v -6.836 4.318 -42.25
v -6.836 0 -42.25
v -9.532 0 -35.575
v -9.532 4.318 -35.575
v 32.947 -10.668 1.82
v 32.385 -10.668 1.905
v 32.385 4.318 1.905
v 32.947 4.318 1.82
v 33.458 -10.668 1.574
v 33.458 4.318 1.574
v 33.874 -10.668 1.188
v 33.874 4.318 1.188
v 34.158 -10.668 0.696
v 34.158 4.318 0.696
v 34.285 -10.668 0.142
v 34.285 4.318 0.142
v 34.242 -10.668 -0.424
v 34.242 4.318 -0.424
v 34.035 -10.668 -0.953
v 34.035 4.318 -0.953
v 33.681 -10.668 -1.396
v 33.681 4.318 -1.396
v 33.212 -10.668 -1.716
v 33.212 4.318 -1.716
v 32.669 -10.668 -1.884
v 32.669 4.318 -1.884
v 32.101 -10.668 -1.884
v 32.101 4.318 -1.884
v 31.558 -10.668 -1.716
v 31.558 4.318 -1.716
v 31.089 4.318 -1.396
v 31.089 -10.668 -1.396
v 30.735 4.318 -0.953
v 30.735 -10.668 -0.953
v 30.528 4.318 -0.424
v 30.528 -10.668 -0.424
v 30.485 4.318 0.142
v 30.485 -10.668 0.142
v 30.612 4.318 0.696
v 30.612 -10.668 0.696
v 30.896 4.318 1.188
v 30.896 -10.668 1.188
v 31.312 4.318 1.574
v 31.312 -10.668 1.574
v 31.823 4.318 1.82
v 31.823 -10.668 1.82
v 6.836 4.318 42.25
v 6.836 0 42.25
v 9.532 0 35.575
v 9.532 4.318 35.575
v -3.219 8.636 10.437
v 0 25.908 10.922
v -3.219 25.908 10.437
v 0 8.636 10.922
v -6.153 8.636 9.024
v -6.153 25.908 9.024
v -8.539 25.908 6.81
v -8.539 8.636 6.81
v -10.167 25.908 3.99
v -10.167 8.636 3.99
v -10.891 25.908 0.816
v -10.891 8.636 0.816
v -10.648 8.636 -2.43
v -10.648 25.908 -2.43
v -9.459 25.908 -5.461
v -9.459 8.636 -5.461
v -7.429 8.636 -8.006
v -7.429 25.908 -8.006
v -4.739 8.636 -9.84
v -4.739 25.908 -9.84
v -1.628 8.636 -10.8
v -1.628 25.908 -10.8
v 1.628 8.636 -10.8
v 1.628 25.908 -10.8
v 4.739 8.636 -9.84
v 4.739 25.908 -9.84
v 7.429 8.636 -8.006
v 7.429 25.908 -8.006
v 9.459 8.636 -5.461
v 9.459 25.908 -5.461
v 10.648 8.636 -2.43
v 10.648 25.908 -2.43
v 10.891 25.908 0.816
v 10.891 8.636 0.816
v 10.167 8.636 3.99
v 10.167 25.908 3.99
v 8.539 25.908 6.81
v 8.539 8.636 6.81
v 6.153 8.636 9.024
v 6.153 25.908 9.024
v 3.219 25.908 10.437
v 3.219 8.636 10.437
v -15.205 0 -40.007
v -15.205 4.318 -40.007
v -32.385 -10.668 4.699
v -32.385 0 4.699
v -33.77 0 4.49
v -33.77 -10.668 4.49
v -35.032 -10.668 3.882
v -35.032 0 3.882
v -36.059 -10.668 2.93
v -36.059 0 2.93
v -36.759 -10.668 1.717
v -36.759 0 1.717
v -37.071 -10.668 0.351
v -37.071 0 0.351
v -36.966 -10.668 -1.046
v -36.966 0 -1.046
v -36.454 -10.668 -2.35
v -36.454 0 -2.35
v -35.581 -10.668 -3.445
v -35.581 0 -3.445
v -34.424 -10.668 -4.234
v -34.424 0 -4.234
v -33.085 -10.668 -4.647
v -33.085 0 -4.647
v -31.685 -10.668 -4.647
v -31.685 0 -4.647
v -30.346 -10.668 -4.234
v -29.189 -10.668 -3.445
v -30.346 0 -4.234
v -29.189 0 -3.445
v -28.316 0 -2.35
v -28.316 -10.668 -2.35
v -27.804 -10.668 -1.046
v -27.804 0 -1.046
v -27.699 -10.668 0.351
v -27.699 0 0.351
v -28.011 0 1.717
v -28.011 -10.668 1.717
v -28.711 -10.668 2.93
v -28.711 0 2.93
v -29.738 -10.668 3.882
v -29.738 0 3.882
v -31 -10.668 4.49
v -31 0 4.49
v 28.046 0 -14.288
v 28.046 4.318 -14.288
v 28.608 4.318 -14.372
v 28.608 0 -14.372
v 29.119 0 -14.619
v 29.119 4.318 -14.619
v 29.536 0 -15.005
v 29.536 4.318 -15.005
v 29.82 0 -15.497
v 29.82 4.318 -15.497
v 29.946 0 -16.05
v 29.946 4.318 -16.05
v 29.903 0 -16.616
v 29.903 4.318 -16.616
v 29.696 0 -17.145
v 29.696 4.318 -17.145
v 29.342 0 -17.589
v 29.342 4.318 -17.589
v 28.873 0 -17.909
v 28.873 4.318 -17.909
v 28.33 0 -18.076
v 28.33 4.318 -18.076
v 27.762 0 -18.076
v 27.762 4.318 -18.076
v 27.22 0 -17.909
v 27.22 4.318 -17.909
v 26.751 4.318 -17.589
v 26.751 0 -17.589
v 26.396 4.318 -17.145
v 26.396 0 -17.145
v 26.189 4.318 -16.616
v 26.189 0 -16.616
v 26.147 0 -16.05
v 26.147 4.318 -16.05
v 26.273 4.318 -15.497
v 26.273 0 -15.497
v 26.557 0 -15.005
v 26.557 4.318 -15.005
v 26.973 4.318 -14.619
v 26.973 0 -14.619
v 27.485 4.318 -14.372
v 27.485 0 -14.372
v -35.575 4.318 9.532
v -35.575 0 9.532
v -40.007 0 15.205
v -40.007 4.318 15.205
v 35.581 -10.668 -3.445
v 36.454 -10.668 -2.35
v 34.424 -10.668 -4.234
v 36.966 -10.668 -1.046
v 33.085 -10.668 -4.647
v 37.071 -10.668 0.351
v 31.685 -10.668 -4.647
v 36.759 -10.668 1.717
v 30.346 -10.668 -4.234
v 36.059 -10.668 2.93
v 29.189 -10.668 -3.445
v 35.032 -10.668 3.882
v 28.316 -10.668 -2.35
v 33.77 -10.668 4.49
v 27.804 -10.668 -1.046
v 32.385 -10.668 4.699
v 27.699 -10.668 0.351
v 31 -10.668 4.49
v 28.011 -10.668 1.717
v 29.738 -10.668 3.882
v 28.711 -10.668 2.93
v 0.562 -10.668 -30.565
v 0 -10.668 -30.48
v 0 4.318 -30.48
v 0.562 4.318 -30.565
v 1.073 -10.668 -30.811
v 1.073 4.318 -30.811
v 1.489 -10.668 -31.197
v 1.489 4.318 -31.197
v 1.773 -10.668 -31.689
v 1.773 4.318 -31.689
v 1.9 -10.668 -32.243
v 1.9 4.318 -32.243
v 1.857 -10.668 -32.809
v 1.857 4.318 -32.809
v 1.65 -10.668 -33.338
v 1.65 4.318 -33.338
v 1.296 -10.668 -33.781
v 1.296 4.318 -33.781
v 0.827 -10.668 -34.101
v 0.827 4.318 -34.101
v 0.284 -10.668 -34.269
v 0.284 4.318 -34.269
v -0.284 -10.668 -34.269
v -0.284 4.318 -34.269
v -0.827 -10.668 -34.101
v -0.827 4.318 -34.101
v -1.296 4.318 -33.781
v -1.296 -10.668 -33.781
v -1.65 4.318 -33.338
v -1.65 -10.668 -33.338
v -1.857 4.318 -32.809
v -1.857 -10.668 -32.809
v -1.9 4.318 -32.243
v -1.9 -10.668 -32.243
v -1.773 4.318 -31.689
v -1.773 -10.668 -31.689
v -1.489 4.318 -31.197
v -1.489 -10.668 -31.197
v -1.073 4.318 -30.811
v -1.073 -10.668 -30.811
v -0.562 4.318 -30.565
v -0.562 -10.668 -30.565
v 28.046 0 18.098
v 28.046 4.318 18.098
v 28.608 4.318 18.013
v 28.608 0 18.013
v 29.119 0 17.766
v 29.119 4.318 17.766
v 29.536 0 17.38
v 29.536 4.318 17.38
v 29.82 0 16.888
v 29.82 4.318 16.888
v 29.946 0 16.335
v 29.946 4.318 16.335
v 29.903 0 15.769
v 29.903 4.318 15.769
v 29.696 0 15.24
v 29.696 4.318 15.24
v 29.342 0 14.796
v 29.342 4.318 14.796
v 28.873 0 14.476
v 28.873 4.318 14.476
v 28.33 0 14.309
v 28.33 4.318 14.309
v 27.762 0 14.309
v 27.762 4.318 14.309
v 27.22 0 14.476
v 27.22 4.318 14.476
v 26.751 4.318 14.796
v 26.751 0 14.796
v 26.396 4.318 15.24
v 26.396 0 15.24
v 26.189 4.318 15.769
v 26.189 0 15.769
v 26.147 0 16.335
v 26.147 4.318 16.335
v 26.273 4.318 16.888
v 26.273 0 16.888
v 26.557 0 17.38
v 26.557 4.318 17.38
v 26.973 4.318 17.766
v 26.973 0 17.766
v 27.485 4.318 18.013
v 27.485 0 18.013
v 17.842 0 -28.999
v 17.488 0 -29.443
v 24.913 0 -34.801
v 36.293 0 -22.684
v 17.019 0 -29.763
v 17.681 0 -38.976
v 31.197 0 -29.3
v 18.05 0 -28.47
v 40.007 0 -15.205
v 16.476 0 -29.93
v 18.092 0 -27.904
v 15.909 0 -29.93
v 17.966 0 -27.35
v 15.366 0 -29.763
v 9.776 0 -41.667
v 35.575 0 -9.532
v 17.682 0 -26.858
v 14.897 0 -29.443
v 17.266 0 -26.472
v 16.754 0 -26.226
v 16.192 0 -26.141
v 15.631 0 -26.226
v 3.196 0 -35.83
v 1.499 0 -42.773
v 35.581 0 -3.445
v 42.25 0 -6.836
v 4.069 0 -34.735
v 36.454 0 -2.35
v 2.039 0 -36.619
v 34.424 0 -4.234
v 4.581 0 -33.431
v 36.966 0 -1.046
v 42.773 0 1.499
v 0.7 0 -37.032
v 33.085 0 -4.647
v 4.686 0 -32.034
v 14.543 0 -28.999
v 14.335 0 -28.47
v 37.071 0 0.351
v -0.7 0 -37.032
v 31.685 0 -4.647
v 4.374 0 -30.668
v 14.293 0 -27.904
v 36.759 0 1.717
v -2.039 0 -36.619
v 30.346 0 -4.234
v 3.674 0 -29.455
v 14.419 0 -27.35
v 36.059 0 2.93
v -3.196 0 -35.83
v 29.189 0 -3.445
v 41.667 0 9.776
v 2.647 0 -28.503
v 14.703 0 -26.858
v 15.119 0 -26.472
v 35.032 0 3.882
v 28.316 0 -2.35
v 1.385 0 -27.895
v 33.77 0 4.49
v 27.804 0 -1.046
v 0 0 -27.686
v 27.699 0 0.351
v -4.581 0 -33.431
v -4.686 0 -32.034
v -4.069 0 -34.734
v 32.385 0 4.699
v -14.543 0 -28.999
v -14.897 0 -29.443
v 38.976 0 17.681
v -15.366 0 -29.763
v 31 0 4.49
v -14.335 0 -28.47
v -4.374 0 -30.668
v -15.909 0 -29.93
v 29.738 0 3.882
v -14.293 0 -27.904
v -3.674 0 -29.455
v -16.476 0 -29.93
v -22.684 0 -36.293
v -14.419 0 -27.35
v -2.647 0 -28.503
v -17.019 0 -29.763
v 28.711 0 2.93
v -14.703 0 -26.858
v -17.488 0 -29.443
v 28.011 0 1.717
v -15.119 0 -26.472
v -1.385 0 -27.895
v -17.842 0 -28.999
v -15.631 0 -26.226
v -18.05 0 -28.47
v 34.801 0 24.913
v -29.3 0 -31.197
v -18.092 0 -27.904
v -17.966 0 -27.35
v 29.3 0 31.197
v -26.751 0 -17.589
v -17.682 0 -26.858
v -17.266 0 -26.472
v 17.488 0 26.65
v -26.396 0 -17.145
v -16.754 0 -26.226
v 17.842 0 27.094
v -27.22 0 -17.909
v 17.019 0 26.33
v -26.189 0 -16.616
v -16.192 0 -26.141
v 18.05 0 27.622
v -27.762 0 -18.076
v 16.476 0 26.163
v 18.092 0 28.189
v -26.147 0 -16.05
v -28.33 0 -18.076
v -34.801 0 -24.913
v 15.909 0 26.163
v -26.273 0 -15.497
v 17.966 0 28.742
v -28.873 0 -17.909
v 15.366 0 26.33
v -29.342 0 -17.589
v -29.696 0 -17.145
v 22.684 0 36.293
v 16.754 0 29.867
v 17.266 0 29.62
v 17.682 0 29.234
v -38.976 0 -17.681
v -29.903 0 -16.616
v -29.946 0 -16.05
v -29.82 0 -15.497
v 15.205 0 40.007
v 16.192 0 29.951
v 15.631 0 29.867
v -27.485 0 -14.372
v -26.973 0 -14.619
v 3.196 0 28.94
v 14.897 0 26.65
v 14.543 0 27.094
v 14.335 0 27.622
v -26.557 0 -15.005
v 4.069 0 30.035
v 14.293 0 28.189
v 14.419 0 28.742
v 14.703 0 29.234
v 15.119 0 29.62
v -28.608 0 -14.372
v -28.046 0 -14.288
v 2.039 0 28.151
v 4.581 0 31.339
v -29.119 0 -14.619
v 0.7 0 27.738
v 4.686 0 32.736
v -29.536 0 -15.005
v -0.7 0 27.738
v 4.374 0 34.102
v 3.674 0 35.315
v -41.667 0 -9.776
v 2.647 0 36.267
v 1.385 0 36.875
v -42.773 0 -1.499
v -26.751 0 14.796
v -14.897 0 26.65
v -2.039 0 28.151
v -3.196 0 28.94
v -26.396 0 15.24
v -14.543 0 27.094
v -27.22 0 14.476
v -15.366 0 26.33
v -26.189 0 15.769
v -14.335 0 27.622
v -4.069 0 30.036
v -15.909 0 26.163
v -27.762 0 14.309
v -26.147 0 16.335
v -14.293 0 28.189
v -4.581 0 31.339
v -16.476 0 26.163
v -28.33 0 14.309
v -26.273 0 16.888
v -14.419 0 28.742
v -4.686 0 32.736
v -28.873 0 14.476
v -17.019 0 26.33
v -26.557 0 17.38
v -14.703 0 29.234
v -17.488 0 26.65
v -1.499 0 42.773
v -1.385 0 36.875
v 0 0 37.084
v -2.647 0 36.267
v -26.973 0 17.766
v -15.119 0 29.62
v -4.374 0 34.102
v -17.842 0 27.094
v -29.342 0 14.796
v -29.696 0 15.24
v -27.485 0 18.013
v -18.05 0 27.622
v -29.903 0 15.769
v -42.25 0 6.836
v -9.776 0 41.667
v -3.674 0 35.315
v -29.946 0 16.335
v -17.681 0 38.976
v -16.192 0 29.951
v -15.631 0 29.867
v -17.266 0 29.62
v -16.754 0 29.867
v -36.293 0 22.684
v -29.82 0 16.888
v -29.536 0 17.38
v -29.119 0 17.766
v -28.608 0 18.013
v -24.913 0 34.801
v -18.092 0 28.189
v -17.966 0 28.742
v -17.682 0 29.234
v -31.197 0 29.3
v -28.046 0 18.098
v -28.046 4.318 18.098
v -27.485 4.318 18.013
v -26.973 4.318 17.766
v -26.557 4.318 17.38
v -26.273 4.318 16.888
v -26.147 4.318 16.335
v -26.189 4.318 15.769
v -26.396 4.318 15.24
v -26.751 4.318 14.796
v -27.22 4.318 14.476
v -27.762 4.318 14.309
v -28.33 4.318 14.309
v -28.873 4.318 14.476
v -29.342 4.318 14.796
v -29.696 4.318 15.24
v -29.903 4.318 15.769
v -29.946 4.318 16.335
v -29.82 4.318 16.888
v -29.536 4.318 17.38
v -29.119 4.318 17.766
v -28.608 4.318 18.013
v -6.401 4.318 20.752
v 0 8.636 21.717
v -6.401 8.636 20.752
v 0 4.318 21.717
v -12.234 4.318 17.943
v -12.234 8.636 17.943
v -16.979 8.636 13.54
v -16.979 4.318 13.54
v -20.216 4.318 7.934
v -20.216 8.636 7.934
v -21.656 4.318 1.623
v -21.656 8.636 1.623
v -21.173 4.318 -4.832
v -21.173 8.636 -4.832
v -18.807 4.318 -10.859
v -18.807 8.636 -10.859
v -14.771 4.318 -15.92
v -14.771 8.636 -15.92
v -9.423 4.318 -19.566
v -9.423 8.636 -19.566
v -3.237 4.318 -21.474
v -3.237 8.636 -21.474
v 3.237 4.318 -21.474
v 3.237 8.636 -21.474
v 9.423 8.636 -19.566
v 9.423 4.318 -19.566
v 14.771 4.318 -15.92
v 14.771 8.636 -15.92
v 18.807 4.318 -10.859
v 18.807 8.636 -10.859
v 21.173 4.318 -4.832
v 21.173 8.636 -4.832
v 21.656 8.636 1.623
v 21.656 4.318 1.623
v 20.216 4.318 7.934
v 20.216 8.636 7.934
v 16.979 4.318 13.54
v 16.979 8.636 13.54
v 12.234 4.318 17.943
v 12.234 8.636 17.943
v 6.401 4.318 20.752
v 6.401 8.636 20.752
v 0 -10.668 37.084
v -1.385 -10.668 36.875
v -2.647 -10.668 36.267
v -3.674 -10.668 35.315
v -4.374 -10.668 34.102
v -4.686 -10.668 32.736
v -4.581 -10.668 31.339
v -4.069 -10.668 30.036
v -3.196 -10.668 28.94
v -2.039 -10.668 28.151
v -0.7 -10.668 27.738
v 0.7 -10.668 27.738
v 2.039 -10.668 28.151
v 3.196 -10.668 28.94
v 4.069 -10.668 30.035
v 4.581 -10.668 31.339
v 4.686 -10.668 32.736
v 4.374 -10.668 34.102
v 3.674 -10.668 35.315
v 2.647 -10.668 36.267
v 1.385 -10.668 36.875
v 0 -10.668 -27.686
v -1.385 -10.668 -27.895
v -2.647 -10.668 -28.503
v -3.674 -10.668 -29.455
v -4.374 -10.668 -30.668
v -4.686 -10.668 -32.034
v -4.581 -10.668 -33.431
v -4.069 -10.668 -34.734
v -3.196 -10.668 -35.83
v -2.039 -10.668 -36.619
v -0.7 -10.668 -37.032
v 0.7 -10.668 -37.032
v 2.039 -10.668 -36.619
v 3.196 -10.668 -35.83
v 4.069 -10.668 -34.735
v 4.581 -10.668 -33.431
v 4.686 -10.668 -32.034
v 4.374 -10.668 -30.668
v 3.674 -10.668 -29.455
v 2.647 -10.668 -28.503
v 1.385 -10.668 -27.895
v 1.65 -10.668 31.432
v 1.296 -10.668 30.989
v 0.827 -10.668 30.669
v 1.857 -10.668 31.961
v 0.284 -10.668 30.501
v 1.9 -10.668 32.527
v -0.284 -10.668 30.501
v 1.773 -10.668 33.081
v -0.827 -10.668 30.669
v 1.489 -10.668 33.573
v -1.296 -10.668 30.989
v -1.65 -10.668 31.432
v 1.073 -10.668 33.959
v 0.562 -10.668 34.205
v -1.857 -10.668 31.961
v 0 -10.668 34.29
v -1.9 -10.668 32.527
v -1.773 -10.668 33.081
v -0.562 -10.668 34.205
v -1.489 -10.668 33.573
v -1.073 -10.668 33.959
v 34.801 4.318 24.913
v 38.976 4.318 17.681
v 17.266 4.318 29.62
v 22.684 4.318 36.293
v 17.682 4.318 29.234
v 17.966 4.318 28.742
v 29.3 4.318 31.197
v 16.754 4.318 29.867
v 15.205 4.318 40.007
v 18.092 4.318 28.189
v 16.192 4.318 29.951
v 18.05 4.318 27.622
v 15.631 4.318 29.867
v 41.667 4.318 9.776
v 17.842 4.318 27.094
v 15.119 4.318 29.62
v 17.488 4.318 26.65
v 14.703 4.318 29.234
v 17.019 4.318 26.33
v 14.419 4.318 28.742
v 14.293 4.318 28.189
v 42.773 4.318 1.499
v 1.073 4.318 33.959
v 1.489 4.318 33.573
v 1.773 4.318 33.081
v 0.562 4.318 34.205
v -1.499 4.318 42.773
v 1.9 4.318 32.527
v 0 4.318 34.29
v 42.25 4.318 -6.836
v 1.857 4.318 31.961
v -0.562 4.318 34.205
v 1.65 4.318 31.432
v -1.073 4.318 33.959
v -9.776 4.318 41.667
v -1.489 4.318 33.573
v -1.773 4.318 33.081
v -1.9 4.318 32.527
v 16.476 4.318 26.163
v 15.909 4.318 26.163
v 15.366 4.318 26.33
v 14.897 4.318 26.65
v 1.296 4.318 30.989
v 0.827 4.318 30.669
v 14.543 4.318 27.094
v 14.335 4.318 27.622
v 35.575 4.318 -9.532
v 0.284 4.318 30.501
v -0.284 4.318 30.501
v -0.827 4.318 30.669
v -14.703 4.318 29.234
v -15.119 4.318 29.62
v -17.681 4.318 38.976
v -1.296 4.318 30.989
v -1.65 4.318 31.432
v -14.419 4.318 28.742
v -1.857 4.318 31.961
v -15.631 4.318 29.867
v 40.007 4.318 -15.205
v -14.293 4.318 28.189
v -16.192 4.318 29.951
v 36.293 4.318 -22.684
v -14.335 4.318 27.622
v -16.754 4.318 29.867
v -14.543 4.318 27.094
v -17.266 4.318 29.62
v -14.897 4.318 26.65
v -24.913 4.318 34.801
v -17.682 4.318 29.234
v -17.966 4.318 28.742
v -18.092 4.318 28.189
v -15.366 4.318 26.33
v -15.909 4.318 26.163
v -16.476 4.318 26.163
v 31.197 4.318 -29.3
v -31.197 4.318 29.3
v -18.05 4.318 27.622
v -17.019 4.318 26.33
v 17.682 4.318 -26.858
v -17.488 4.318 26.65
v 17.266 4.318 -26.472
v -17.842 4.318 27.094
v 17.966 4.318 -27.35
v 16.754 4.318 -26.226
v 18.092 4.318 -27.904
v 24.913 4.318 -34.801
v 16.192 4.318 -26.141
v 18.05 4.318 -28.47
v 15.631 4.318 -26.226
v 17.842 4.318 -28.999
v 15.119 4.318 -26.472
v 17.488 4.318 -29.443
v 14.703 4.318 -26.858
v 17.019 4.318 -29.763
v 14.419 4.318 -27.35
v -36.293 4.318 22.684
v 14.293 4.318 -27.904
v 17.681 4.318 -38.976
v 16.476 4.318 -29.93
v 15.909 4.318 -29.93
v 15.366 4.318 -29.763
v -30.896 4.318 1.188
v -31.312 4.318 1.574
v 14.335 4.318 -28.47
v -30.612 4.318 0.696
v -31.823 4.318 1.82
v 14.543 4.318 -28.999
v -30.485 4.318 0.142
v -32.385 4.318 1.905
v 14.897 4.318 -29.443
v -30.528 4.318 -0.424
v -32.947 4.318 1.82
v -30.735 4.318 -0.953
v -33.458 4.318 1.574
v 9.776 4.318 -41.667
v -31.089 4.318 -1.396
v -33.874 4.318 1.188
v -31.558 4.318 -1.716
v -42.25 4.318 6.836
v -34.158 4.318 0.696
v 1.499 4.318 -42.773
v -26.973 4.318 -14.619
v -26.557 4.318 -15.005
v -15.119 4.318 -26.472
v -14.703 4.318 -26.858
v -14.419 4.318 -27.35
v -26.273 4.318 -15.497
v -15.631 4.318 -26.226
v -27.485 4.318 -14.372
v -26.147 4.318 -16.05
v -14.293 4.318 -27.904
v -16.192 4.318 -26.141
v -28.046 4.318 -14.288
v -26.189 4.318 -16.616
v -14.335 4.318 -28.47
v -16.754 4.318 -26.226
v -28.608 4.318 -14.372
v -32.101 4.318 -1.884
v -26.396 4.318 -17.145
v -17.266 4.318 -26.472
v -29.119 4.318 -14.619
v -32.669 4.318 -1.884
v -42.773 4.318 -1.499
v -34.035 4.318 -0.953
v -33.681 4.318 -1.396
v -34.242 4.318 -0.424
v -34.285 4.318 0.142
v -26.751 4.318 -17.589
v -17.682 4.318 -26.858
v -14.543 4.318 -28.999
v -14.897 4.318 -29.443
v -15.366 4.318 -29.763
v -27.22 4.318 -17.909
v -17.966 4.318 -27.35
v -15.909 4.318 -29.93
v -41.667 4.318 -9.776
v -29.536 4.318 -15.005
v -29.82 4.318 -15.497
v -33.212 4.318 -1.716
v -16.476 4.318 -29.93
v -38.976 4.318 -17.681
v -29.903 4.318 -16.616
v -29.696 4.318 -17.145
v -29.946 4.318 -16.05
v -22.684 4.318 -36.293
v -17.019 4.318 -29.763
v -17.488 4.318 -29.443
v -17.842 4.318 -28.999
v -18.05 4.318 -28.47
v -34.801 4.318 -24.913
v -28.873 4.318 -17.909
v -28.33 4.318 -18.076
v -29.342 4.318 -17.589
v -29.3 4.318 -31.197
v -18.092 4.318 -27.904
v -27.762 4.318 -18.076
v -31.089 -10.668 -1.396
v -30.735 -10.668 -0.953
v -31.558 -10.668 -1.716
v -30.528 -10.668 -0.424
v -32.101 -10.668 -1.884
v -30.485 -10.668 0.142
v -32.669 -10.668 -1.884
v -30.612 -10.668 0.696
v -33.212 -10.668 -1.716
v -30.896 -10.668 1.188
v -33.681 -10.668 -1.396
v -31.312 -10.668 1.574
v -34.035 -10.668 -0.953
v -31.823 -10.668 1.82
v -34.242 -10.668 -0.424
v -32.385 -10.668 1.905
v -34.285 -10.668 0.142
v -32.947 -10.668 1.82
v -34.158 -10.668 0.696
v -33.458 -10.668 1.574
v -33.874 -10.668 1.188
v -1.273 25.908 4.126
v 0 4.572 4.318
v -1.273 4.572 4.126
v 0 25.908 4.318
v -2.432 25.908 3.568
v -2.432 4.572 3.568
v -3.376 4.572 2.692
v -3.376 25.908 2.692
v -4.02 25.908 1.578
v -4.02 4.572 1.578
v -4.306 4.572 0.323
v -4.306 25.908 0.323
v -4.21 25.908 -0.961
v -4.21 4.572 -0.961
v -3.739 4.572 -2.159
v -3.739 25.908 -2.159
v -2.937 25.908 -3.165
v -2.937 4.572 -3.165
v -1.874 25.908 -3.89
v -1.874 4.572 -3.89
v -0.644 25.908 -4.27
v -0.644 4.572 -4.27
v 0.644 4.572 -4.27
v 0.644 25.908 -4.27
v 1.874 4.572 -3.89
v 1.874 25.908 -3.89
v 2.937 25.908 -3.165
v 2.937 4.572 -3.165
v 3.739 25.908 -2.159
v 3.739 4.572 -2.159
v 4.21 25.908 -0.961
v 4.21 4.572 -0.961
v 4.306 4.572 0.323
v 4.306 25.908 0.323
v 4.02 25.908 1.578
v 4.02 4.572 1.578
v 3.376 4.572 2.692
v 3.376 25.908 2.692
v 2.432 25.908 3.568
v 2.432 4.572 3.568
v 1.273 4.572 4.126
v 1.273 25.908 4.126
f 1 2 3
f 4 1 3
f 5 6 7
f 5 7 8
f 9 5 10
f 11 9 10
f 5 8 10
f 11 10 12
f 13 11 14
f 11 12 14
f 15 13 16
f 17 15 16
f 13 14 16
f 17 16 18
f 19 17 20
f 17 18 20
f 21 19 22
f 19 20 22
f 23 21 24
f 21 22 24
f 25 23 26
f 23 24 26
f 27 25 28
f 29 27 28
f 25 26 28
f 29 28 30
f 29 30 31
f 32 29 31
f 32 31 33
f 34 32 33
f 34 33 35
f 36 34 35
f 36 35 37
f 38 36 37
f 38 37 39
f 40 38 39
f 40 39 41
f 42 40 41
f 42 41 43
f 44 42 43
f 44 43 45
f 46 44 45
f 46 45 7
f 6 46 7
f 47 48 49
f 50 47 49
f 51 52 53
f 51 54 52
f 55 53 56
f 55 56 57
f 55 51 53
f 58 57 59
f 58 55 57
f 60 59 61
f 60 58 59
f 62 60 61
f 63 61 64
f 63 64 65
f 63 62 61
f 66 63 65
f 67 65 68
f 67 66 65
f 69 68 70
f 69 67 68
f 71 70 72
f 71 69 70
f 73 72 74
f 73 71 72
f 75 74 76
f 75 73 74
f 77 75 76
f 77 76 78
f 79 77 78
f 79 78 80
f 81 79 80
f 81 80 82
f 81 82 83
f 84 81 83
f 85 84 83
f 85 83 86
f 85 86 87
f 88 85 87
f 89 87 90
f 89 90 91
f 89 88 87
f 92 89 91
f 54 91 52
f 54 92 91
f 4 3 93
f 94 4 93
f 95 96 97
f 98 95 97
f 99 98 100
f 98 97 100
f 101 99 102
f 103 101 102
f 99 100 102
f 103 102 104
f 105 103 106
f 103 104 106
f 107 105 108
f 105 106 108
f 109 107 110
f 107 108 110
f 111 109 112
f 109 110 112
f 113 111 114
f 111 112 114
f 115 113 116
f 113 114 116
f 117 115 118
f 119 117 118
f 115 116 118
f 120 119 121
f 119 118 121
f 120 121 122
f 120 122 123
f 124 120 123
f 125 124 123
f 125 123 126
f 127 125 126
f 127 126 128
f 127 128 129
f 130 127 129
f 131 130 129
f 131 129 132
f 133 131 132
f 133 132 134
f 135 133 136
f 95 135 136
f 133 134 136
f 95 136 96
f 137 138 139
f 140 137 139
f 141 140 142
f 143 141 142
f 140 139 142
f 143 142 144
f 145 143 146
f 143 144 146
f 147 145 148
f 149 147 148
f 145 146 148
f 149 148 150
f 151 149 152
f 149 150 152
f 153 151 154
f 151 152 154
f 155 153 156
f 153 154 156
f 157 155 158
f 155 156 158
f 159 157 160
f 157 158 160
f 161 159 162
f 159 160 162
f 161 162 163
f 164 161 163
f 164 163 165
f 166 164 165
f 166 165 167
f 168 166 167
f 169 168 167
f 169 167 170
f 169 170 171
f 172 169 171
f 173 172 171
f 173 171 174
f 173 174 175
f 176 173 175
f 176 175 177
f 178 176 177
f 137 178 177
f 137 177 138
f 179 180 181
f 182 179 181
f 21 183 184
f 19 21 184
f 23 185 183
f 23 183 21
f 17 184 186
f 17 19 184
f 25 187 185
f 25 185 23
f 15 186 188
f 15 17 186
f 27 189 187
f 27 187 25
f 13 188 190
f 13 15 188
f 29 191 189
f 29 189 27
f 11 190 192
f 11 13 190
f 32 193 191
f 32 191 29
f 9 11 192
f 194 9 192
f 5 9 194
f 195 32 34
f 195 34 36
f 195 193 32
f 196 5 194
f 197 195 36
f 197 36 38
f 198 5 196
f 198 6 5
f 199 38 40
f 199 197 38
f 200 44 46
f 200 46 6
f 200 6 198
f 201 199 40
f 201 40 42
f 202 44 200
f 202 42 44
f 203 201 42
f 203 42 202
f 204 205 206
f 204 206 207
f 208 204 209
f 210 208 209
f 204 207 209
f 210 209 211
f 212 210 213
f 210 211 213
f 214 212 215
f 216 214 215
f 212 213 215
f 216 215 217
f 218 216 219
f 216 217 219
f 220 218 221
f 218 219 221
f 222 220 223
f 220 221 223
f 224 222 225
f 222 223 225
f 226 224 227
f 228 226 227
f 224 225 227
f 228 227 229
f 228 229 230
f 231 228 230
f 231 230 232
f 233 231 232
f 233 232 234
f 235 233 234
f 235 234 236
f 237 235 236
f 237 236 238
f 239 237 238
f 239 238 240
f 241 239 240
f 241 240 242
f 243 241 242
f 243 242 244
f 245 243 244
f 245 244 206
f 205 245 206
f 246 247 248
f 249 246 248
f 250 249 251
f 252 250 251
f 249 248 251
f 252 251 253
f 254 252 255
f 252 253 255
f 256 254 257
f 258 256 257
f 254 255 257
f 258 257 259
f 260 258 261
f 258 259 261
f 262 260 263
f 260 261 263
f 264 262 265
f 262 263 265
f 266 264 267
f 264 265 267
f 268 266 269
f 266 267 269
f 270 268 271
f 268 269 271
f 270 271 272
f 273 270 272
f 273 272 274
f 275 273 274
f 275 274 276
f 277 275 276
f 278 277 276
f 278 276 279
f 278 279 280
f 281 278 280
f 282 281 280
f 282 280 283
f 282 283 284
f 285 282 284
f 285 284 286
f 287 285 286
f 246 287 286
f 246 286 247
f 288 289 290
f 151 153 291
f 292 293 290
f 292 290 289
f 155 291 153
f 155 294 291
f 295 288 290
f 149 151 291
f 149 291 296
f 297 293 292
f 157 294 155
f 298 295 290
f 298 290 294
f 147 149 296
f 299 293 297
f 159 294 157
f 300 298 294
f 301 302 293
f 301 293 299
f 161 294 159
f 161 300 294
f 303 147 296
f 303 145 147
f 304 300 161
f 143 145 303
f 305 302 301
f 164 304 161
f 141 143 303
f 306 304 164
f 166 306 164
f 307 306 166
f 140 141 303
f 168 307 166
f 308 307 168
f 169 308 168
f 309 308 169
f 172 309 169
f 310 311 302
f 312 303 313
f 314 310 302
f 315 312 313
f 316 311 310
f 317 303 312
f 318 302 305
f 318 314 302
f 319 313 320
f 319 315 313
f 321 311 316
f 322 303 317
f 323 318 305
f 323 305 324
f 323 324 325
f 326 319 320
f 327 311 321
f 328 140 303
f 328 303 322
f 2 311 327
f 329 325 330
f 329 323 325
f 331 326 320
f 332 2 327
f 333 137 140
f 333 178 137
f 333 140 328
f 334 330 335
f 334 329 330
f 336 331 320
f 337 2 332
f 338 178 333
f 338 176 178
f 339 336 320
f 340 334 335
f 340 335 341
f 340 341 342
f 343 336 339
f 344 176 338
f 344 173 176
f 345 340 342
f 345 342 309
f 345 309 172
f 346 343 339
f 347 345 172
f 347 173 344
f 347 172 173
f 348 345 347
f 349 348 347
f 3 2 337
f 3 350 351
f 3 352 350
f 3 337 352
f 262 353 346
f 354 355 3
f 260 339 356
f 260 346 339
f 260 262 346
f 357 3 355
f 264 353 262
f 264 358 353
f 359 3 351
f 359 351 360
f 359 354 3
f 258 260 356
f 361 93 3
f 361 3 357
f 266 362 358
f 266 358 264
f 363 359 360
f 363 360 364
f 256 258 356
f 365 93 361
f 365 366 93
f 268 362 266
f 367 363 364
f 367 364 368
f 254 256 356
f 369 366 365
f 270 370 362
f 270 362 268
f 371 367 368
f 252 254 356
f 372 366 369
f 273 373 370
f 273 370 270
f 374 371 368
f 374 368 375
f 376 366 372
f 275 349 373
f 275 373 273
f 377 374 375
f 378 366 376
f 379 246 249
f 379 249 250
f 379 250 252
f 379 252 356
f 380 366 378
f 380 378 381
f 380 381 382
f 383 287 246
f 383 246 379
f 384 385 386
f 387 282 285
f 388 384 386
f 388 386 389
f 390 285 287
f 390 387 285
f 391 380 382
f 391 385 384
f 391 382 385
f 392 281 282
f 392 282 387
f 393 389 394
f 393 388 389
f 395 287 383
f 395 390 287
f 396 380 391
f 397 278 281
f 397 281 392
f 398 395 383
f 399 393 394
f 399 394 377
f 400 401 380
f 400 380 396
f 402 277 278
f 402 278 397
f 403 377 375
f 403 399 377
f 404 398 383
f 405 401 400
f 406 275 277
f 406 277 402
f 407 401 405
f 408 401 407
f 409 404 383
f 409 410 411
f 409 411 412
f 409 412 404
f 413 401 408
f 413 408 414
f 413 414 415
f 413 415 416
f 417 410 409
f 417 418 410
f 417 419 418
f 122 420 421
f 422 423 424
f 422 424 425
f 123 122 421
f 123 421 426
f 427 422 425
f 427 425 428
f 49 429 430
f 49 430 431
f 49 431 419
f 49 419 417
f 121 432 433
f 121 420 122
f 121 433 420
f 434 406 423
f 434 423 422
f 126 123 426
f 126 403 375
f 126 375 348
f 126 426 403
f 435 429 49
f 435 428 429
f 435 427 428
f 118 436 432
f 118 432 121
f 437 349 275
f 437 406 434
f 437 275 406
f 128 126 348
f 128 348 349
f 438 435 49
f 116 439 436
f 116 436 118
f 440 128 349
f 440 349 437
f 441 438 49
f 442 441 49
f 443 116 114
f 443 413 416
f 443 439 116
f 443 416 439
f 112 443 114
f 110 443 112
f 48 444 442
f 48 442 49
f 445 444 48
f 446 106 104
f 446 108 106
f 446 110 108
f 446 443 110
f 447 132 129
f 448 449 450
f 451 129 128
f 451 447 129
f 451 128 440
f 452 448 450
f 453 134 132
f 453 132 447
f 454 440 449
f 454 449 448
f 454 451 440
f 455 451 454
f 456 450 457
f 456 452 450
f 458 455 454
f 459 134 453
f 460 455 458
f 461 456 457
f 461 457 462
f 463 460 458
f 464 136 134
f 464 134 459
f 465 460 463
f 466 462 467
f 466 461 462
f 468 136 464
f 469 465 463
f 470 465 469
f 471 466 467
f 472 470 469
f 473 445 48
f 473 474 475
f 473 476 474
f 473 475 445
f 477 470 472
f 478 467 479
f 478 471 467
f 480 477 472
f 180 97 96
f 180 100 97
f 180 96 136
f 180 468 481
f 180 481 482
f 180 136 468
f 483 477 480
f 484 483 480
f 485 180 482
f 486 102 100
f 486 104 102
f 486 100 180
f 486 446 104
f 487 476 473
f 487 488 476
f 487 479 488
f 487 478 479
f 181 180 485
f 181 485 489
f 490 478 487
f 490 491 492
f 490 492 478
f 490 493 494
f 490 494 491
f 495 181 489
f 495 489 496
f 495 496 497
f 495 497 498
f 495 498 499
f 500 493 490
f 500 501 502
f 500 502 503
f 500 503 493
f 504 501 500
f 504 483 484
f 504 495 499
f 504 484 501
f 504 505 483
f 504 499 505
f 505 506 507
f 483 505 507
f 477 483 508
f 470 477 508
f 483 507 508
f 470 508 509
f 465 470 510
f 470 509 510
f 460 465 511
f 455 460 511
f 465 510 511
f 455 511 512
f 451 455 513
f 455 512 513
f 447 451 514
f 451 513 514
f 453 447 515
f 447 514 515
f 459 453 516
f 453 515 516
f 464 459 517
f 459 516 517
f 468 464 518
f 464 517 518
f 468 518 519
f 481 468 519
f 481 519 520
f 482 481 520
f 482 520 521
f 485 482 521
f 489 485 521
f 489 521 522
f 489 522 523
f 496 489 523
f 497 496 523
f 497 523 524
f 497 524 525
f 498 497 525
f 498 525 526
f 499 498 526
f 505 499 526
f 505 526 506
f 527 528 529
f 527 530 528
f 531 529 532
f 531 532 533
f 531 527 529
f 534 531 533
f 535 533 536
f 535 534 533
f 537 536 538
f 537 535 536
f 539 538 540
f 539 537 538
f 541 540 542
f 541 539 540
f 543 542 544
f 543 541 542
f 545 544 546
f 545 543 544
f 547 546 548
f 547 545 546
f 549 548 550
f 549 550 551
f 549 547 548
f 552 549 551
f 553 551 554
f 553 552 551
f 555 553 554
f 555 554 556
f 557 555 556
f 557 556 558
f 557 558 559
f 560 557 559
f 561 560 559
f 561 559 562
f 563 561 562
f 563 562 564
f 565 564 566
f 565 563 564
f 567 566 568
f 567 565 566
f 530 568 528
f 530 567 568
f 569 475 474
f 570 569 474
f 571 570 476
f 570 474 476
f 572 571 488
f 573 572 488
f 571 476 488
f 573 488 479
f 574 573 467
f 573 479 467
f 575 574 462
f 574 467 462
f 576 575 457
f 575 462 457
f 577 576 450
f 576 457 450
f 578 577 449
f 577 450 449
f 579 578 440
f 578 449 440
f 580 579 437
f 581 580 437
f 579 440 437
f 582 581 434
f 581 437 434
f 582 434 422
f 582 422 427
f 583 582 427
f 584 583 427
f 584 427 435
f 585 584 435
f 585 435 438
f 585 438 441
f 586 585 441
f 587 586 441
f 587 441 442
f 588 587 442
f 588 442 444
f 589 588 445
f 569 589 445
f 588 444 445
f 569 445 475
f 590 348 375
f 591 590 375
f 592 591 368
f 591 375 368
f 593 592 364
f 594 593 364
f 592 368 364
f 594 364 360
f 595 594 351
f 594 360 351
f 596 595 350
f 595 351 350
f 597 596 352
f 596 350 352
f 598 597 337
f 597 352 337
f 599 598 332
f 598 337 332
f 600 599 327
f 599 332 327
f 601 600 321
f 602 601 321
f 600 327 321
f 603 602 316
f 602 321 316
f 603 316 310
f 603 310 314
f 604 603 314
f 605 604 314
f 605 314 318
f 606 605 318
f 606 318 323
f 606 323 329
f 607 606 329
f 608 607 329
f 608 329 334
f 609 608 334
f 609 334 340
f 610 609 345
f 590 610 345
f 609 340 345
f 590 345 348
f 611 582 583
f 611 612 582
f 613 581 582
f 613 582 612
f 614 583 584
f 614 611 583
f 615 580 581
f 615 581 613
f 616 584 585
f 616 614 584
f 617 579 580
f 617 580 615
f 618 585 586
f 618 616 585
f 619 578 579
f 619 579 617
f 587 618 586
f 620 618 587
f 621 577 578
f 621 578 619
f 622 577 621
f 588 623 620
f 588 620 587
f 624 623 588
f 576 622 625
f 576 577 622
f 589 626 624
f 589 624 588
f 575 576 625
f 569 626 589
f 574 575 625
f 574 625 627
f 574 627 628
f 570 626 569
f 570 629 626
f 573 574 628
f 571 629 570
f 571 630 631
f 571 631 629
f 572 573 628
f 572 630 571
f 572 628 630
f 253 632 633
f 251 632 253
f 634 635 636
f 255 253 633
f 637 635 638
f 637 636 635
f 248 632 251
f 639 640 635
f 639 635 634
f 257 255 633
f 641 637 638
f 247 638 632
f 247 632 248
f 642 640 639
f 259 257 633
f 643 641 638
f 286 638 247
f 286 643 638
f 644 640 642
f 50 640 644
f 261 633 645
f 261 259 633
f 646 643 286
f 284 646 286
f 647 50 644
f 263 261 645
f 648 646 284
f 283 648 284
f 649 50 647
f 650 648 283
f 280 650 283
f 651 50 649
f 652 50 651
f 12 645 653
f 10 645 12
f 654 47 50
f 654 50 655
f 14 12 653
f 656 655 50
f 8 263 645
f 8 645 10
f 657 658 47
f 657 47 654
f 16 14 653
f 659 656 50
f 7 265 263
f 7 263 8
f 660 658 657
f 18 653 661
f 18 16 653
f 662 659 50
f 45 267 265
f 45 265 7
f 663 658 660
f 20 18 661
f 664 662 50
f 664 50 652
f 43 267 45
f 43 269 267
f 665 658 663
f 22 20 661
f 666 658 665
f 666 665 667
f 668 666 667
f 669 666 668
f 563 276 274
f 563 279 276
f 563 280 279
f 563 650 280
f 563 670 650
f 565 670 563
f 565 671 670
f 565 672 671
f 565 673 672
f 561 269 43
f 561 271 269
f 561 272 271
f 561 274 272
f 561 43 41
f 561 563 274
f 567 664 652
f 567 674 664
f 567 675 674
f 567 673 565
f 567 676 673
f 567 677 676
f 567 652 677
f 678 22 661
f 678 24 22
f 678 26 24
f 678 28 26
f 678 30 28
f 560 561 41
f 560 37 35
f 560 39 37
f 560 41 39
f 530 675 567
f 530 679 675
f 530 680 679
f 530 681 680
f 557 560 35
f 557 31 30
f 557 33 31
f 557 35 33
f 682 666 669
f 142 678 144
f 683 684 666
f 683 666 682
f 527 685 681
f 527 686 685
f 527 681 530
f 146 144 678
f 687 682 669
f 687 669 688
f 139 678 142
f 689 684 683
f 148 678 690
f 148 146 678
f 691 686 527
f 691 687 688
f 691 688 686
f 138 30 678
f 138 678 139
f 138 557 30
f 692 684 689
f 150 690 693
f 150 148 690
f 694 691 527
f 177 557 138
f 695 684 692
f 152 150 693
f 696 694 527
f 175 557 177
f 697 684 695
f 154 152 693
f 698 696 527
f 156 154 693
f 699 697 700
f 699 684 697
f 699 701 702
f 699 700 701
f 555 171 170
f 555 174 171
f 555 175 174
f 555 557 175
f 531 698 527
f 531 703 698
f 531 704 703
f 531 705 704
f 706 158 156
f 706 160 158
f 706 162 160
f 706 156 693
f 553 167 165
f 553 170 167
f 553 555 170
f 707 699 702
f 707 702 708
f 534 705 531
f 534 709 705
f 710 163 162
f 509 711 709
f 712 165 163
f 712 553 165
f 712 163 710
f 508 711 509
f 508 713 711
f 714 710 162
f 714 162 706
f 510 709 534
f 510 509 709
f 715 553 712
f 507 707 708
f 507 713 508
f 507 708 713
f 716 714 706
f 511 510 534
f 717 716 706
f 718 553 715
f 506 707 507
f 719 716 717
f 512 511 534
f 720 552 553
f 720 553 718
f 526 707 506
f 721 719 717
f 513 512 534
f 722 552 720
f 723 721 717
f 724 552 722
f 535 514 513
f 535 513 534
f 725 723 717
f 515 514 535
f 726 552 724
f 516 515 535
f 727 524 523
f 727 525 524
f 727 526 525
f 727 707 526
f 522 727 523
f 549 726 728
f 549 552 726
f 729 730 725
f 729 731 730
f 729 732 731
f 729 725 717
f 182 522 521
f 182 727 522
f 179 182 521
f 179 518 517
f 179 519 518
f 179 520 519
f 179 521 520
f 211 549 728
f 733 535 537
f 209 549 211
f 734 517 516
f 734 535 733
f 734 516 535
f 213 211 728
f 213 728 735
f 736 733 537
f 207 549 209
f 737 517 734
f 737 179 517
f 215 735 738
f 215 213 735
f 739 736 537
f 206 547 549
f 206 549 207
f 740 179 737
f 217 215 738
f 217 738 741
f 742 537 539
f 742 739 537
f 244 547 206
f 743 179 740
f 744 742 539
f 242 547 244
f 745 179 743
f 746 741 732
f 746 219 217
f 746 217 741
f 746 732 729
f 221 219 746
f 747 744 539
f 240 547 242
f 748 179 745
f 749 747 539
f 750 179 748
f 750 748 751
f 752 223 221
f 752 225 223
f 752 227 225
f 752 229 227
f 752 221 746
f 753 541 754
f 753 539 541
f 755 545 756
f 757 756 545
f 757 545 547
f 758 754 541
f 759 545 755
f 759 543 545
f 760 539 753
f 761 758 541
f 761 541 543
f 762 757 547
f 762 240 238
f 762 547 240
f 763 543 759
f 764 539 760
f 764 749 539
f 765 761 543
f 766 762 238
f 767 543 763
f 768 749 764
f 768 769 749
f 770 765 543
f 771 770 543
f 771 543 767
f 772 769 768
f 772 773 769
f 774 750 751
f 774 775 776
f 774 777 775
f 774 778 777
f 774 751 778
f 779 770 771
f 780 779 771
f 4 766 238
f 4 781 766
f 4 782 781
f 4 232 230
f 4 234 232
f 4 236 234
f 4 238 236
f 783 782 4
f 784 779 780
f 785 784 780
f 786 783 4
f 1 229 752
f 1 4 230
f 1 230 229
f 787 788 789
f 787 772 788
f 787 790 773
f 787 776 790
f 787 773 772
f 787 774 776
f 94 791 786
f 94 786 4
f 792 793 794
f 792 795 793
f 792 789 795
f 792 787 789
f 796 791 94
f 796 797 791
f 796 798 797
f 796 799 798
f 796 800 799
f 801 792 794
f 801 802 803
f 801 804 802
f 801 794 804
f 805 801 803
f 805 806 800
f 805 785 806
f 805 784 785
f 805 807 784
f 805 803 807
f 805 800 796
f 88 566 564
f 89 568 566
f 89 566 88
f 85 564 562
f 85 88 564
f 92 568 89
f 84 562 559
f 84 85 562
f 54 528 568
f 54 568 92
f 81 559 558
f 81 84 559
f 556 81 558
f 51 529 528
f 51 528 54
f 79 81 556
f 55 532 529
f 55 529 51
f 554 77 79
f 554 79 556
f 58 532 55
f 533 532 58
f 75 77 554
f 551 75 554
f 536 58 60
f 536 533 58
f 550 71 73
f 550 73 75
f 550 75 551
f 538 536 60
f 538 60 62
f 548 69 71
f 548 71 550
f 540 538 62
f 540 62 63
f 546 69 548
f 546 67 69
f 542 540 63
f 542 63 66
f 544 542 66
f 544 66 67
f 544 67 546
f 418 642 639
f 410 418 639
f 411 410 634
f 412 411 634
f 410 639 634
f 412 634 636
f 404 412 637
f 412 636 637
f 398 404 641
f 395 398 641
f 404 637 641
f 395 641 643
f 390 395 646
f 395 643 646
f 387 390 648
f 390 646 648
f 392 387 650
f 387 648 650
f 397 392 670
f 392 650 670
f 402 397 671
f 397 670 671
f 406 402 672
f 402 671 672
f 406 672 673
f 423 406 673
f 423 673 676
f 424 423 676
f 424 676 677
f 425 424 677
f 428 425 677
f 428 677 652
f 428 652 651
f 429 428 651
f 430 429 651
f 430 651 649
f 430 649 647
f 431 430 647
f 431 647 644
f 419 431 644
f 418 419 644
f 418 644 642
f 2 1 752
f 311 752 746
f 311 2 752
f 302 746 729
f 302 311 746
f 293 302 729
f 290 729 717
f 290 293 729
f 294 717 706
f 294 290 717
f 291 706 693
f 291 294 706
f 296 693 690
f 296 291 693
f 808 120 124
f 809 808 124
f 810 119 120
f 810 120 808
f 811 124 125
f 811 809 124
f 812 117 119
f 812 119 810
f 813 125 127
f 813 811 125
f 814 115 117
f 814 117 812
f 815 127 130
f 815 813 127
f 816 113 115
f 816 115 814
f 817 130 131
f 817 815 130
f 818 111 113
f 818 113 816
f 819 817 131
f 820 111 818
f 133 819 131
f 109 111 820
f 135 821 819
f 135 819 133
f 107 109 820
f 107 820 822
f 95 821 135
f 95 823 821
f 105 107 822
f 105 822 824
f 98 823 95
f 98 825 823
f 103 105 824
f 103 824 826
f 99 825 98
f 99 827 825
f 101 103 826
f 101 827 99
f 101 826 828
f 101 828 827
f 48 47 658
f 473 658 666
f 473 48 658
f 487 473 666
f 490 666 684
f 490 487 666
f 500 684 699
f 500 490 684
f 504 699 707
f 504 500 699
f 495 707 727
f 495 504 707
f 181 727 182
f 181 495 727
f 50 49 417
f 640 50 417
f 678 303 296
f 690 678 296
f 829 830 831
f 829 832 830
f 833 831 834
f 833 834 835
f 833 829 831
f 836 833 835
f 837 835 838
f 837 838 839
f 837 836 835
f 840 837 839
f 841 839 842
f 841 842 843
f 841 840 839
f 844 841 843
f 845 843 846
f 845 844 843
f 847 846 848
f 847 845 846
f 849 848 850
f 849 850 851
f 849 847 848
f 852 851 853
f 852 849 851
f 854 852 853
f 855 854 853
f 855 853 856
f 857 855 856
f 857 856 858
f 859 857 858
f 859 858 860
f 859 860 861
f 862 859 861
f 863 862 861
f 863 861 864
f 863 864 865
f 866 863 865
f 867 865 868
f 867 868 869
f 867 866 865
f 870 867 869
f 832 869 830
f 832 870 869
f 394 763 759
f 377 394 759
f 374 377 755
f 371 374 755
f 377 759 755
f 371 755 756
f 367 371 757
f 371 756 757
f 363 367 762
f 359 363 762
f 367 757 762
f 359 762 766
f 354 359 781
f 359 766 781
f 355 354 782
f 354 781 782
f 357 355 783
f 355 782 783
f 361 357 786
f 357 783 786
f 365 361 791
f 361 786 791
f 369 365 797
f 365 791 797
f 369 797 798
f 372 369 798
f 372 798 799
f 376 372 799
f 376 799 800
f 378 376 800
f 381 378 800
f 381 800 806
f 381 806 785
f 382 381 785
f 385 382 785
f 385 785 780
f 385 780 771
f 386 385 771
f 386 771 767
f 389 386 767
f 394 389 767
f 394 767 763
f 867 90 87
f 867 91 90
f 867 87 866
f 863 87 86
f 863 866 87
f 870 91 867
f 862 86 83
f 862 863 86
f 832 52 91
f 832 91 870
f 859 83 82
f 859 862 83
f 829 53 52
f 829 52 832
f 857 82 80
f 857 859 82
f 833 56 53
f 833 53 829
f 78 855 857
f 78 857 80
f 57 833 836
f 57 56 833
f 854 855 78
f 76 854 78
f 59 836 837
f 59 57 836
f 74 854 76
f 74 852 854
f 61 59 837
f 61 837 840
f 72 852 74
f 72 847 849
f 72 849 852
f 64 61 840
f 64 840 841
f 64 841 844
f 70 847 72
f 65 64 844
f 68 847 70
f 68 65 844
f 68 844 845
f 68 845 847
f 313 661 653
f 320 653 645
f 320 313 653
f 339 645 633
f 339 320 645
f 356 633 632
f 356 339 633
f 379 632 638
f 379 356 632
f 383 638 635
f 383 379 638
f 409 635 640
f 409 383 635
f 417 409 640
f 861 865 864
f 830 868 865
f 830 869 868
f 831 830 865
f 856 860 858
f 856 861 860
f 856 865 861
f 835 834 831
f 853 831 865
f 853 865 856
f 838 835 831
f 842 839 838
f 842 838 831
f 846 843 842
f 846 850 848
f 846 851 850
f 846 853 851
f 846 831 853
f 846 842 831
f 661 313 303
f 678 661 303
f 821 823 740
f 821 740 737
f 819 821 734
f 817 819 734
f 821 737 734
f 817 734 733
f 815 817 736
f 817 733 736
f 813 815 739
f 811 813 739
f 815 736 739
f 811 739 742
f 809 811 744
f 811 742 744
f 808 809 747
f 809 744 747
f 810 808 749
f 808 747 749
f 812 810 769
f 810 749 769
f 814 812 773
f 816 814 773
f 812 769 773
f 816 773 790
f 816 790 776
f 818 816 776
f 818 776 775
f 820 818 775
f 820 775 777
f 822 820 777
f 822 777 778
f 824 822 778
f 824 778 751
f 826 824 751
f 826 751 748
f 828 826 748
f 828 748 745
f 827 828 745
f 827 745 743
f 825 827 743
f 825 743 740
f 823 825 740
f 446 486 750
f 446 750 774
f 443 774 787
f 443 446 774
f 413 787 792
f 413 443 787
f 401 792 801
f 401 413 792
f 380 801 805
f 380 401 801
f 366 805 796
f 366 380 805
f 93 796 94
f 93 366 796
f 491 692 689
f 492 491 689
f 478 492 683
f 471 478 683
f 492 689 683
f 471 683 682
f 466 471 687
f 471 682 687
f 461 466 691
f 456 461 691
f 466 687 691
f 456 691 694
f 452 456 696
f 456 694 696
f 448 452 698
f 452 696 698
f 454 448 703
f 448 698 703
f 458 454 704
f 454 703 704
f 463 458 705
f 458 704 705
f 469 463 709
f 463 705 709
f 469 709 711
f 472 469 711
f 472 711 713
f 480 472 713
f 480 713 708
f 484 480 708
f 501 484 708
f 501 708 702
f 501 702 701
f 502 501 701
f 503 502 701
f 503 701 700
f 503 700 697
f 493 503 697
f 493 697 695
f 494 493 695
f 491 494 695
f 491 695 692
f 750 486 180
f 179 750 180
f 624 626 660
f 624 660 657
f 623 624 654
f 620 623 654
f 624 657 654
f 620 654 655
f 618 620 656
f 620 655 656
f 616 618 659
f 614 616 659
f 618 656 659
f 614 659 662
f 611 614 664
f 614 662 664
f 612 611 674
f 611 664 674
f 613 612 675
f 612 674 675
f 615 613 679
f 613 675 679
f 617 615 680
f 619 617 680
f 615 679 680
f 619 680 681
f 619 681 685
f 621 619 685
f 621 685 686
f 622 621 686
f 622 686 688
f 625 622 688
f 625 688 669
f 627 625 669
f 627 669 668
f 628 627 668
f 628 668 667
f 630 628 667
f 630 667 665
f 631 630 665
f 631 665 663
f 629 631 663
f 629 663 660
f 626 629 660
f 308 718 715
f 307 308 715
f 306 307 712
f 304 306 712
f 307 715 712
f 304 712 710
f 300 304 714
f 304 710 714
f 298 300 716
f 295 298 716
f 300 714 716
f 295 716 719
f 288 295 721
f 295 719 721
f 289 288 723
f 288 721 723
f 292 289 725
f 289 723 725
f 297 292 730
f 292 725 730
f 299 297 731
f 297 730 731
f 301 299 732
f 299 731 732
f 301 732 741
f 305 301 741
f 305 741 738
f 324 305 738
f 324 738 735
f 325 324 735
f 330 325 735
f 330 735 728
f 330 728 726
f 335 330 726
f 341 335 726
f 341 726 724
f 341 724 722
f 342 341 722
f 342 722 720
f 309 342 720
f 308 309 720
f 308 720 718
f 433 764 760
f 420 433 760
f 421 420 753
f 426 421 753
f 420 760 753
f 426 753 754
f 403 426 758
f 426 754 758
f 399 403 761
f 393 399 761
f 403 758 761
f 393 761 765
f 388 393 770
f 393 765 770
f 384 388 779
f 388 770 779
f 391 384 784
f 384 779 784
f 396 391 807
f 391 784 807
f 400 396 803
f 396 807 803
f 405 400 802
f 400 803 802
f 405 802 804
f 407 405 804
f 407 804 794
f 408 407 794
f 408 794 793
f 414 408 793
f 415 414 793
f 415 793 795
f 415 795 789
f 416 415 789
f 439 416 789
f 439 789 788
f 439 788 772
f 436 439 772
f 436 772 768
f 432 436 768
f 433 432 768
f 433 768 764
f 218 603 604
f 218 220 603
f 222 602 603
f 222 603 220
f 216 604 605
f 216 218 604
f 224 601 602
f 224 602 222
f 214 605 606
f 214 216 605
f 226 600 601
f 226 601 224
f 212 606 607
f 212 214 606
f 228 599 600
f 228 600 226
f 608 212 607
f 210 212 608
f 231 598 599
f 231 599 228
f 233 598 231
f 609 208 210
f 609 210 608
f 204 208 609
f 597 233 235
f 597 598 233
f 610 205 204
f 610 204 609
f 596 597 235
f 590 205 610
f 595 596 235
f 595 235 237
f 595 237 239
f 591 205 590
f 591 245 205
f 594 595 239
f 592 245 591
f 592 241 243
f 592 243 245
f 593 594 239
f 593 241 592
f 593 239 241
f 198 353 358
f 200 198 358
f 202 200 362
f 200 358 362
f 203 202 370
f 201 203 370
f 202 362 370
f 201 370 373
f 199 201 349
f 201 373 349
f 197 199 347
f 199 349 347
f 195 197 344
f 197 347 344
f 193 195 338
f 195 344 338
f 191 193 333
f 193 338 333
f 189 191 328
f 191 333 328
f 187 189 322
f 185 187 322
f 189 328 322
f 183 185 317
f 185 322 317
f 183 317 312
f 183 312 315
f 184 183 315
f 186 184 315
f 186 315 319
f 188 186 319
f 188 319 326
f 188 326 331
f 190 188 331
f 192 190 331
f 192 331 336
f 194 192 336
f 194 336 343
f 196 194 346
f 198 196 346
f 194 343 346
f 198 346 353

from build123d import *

# Parameters (mm, degrees)
SKETCH4_R           = 4.699
BOSS_EXTRUDE1_DEPTH = 10.668
SKETCH2_R           = 1.905
CUT_EXTRUDE1_DEPTH  = 65.262250988
CUT_EXTRUDE2_DEPTH  = 66.838691254


with BuildPart() as part:
    # Sketch1 → Revolve1 (revolve)
    with BuildSketch(Plane.XY, mode=Mode.PRIVATE) as revolve1_sk:
        Polygon((-42.799, 0), (0, 0), (0, 4.572), (-4.318, 4.572), (-4.318, 25.908), (-10.922, 25.908), (-10.922, 8.636), (-21.717, 8.636), (-21.717, 4.318), (-42.799, 4.318), align=None)
    revolve(revolve1_sk.sketch.rotate(Axis((0, 25.908, 0), (0, -1, 0)), 270), axis=Axis((0, 25.908, 0), (0, -1, 0)))

    # Sketch4 → Boss-Extrude1 (add)
    with BuildSketch(Plane.XZ):
        with Locations(Location((0, 32.385, 0), (0, 0, 90))):
            Circle(SKETCH4_R)
        with Locations(Location((32.385, 0, 0), (0, 0, 90))):
            Circle(SKETCH4_R)
        with Locations(Location((0, -32.385, 0), (0, 0, 90))):
            Circle(SKETCH4_R)
        with Locations(Location((-32.385, 0, 0), (0, 0, 90))):
            Circle(SKETCH4_R)
    extrude(amount=BOSS_EXTRUDE1_DEPTH)

    # Sketch2 → Cut-Extrude1 (cut, through all)
    with BuildSketch(Plane(origin=(0, 4.318, 0), x_dir=(1, 0, 0), z_dir=(0, 1, 0))):
        with Locations(Location((-32.385, 0, 0), (0, 0, 270))):
            Circle(SKETCH2_R)
        with Locations(Location((-28.046232702, 16.1925, 0), (0, 0, 270))):
            Circle(SKETCH2_R)
        with Locations(Location((-16.1925, 28.046232702, 0), (0, 0, 270))):
            Circle(SKETCH2_R)
        with Locations(Location((0, 32.385, 0), (0, 0, 270))):
            Circle(SKETCH2_R)
        with Locations(Location((16.1925, 28.046232702, 0), (0, 0, 270))):
            Circle(SKETCH2_R)
        with Locations(Location((28.046232702, 16.1925, 0), (0, 0, 270))):
            Circle(SKETCH2_R)
        with Locations(Location((32.385, 0, 0), (0, 0, 270))):
            Circle(SKETCH2_R)
        with Locations(Location((28.046232702, -16.1925, 0), (0, 0, 270))):
            Circle(SKETCH2_R)
        with Locations(Location((16.1925, -28.046232702, 0), (0, 0, 270))):
            Circle(SKETCH2_R)
        with Locations(Location((0, -32.385, 0), (0, 0, 270))):
            Circle(SKETCH2_R)
        with Locations(Location((-16.1925, -28.046232702, 0), (0, 0, 270))):
            Circle(SKETCH2_R)
        with Locations(Location((-28.046232702, -16.1925, 0), (0, 0, 270))):
            Circle(SKETCH2_R)
    extrude(amount=-CUT_EXTRUDE1_DEPTH, mode=Mode.SUBTRACT)

    # Sketch3 → Cut-Extrude2 (cut, through all)
    with BuildSketch(Plane.XZ):
        with BuildLine():
            Line((-35.575048182, 9.532305431), (-40.007033608, 15.204988091))
            ThreePointArc((-40.007033608, 15.204988091), (-41.340659439, 11.077196311), (-42.249601481, 6.835610853))
            Line((-42.249601481, 6.835610853), (-35.575048182, 9.532305431))
        make_face()
        with BuildLine():
            ThreePointArc((15.204988091, 40.007033608), (11.077196311, 41.340659439), (6.835610853, 42.249601481))
            Line((6.835610853, 42.249601481), (9.532305431, 35.575048182))
            Line((9.532305431, 35.575048182), (15.204988091, 40.007033608))
        make_face()
        with BuildLine():
            ThreePointArc((40.007033608, -15.204988091), (41.340659439, -11.077196311), (42.249601481, -6.835610853))
            Line((42.249601481, -6.835610853), (35.575048182, -9.532305431))
            Line((35.575048182, -9.532305431), (40.007033608, -15.204988091))
        make_face()
        with BuildLine():
            Line((-9.532305431, -35.575048182), (-15.204988091, -40.007033608))
            ThreePointArc((-15.204988091, -40.007033608), (-11.077196311, -41.340659439), (-6.835610853, -42.249601481))
            Line((-6.835610853, -42.249601481), (-9.532305431, -35.575048182))
        make_face()
    extrude(amount=-CUT_EXTRUDE2_DEPTH, mode=Mode.SUBTRACT)


solid = part.part
